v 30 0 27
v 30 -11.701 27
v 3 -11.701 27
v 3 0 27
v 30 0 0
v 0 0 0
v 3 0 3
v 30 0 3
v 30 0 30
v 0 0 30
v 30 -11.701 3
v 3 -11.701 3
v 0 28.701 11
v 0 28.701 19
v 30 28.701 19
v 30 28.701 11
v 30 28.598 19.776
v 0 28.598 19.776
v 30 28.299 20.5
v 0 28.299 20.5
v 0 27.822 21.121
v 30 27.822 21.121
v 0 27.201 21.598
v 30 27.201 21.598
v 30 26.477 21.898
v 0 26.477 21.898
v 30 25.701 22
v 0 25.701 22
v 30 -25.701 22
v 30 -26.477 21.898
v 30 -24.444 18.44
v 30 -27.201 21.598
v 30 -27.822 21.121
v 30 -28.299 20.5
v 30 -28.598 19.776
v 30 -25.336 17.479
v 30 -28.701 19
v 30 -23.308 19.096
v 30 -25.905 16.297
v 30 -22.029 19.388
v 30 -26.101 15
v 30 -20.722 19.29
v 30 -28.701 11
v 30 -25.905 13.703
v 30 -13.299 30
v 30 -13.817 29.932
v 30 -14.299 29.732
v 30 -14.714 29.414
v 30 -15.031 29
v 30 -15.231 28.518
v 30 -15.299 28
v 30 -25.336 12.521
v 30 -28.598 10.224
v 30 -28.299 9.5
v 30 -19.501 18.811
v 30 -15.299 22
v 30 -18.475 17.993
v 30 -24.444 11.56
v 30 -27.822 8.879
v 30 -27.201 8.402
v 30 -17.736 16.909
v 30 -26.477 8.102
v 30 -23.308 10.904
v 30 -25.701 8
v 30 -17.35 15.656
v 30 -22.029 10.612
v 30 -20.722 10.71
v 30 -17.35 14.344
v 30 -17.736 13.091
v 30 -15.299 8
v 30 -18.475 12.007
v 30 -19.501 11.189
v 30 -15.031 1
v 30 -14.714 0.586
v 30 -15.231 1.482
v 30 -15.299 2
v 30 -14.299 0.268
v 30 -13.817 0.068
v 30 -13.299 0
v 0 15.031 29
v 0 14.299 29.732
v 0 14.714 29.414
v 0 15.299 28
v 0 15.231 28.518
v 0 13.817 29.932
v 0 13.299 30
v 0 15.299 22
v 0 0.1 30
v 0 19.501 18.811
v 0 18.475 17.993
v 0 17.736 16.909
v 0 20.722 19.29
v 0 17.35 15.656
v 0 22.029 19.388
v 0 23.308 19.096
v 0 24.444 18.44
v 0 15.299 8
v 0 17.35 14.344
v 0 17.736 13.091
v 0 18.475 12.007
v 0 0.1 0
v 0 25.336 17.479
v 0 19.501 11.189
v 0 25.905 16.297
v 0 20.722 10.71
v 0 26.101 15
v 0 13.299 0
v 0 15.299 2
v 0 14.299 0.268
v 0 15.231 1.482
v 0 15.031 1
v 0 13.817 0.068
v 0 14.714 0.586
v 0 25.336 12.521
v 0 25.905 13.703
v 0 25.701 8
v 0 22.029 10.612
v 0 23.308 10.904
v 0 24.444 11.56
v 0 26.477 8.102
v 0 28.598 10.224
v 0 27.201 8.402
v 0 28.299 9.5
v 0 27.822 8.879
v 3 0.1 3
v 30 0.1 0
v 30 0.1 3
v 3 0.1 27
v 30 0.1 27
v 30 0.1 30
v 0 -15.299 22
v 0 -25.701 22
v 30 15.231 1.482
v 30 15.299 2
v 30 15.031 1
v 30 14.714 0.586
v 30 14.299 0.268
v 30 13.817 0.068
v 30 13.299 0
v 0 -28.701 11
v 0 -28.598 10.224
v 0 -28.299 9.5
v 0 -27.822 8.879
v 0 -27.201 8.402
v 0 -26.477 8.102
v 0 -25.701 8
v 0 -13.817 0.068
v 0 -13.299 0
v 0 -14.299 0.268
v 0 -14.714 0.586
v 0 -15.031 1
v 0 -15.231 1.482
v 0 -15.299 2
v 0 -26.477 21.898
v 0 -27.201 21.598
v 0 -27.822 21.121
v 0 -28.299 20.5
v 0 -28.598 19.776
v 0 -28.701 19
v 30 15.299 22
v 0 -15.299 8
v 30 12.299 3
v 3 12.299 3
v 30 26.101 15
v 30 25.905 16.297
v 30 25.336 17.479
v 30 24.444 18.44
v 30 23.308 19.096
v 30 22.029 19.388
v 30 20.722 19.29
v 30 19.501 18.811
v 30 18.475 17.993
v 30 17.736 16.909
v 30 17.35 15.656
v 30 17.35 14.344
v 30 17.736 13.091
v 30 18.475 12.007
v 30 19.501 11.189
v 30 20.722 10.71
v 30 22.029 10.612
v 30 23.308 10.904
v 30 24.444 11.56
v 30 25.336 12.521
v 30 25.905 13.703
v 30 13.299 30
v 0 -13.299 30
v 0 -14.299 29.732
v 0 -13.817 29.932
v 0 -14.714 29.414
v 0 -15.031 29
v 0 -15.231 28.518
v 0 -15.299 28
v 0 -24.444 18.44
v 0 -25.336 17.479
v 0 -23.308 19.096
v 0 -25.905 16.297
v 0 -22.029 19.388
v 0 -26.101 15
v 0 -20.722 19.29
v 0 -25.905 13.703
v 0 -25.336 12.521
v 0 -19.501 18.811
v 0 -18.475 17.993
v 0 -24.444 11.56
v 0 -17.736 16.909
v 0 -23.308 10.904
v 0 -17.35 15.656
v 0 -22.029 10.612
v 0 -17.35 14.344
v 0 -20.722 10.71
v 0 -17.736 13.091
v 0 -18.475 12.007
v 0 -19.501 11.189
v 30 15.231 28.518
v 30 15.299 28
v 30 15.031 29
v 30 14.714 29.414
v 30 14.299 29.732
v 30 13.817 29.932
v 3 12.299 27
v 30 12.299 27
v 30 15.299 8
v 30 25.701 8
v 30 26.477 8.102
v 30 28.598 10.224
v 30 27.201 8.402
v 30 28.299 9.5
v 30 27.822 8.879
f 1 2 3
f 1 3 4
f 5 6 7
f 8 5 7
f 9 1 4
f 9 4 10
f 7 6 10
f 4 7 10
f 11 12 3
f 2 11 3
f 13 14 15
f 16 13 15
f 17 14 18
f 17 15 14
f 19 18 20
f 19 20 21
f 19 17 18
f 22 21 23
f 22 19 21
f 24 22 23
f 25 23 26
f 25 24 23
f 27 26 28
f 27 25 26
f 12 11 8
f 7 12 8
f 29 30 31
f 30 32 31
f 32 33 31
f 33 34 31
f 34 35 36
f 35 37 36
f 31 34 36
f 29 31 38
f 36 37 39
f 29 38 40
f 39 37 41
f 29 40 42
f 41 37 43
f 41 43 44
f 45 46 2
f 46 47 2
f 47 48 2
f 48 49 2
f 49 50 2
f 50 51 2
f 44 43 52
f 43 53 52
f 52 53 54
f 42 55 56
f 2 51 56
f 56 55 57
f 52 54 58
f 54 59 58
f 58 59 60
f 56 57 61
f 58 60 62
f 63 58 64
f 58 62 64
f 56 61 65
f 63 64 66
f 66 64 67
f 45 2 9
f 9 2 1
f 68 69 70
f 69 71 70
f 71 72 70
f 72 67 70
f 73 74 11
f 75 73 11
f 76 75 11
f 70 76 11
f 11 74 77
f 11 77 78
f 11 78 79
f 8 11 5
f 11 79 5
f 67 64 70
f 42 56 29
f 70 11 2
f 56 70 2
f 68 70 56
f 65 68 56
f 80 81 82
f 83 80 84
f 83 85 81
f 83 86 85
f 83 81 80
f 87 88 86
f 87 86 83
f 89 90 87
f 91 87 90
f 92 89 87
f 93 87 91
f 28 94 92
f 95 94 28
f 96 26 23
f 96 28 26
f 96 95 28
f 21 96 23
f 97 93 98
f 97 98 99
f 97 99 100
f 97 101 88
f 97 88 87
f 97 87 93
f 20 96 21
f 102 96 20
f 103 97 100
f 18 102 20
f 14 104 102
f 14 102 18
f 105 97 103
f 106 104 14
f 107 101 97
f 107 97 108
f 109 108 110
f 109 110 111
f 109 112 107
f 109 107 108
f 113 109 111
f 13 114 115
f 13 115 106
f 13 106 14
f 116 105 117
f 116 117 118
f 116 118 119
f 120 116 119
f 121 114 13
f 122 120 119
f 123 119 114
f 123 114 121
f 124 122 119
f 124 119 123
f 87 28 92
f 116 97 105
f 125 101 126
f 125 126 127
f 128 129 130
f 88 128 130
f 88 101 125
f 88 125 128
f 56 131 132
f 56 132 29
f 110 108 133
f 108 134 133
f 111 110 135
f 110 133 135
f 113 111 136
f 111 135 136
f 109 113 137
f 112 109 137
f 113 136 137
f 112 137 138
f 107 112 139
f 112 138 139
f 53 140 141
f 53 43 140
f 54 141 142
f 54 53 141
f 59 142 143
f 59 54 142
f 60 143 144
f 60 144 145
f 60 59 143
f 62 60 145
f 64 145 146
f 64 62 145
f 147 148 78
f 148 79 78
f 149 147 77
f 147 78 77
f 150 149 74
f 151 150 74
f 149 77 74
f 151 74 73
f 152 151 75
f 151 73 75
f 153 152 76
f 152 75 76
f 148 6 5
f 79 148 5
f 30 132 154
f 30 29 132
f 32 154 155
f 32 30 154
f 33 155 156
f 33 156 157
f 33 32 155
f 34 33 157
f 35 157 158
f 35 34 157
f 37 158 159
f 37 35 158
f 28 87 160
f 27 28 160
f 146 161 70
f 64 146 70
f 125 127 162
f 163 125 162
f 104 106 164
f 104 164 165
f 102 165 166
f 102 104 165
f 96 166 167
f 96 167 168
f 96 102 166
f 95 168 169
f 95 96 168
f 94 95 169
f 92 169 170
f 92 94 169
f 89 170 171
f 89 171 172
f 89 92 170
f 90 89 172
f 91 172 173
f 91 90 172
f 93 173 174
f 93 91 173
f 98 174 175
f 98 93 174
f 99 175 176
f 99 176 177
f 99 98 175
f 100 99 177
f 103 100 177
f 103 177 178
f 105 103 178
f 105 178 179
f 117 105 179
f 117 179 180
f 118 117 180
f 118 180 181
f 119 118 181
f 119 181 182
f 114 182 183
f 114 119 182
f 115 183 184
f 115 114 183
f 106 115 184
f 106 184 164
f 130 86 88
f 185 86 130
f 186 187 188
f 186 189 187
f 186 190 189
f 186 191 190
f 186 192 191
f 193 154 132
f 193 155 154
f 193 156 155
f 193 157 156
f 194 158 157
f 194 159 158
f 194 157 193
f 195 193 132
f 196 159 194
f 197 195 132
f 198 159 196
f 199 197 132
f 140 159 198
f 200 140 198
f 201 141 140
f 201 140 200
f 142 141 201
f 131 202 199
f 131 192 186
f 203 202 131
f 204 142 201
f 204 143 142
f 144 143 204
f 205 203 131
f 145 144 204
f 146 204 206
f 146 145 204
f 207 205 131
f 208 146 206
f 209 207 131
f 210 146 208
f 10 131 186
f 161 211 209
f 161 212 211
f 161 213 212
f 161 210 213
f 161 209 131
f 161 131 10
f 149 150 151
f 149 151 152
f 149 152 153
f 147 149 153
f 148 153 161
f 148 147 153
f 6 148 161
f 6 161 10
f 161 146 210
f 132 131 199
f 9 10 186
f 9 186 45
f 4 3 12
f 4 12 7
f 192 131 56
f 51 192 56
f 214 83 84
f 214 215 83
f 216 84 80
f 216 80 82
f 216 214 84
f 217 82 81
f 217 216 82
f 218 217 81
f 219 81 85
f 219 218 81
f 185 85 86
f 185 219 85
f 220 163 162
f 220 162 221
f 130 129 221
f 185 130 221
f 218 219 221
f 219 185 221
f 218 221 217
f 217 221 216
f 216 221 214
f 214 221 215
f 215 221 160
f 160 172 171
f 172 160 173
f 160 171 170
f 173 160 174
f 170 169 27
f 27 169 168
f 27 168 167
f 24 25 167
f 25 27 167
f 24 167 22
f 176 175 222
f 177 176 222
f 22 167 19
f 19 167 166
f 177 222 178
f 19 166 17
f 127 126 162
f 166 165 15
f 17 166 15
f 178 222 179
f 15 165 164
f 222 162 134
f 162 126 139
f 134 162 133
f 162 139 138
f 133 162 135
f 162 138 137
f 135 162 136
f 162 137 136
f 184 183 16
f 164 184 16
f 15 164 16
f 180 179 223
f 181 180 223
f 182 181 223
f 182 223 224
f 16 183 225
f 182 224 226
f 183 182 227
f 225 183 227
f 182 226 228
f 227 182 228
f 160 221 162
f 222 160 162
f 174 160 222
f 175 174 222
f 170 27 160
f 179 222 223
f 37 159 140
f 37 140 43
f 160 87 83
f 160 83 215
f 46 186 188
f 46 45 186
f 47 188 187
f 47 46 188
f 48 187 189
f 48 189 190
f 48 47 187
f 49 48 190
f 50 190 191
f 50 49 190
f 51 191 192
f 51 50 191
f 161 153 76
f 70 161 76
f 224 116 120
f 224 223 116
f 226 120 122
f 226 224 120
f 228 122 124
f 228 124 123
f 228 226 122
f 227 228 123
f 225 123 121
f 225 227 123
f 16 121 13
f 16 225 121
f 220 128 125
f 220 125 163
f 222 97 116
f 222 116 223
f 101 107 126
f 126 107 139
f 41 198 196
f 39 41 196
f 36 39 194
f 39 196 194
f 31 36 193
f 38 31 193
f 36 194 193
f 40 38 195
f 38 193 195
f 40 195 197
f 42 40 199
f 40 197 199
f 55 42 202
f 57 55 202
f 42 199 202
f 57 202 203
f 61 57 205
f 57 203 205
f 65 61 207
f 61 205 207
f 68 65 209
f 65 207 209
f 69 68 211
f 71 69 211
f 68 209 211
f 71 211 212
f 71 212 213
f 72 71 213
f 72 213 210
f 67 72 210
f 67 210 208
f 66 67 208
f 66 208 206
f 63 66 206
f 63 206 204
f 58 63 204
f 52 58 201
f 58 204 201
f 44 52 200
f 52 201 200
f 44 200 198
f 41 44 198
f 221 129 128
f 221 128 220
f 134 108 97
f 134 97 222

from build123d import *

# Parameters (mm, degrees)
F0_W      = 30
F0_H      = 30
F1_DEPTH  = 30
F2_W      = 30
F2_H      = 14
F3_DEPTH  = 14
F4_R      = 4.4
F5_DEPTH  = 30
F7_R      = 3
F8_R      = 3
F9_W      = 24
F9_H      = 24
F10_DEPTH = 27
F11_R     = 2
F12_W     = 0.1
F12_H     = 30
F13_DEPTH = 30


with BuildPart() as f1:
    # F0 (on Top) → F1 (new body)
    with BuildSketch(Plane.XY):
        with Locations((15, 0.29939726)):
            Rectangle(F0_W, F0_H)
    extrude(amount=F1_DEPTH)

    # F2 (on face) → F3 (join)
    with BuildSketch(Plane.XZ.offset(14.70060274)):
        with Locations((15, 15)):
            Rectangle(F2_W, F2_H)
    extrude(amount=F3_DEPTH)

    # F4 (on face) → F5 (cut)
    with BuildSketch(Plane(origin=(0, 0, 0), x_dir=(0, -1, 0), z_dir=(-1, 0, 0))):
        with Locations((21.70060274, 15)):
            Circle(F4_R)
    extrude(amount=-F5_DEPTH, mode=Mode.SUBTRACT)

    # F6: F1 across plane


with BuildPart() as f1_1:
    add(f1.part)
    add(f1.part.mirror(Plane.XZ))

    # F7
    f7_edges = [f1_1.edges().sort_by_distance(p)[0] for p in [
        (15, -28.700603, 8),
        (15, -28.700603, 22),
    ]]
    fillet(f7_edges, radius=F7_R)

    # F8
    f8_edges = [f1_1.edges().sort_by_distance(p)[0] for p in [
        (15, 28.700603, 8),
        (15, 28.700603, 22),
    ]]
    fillet(f8_edges, radius=F8_R)

    # F9 (on face) → F10 (cut)
    with BuildSketch(Plane.YZ.offset(30)):
        with Locations((0.29939726, 15)):
            Rectangle(F9_W, F9_H)
    extrude(amount=-F10_DEPTH, mode=Mode.SUBTRACT)

    # F11
    f11_edges = [f1_1.edges().sort_by_distance(p)[0] for p in [
        (15, -15.299397, 0),
        (15, -15.299397, 30),
        (15, 15.299397, 30),
        (15, 15.299397, 0),
    ]]
    fillet(f11_edges, radius=F11_R)

    # F12 (on face) → F13 (cut)
    with BuildSketch(Plane(origin=(0, 0, 0), x_dir=(0, -1, 0), z_dir=(-1, 0, 0))):
        with Locations((-0.05, 15)):
            Rectangle(F12_W, F12_H)
    extrude(amount=-F13_DEPTH, mode=Mode.SUBTRACT)


solid = f1_1.part
